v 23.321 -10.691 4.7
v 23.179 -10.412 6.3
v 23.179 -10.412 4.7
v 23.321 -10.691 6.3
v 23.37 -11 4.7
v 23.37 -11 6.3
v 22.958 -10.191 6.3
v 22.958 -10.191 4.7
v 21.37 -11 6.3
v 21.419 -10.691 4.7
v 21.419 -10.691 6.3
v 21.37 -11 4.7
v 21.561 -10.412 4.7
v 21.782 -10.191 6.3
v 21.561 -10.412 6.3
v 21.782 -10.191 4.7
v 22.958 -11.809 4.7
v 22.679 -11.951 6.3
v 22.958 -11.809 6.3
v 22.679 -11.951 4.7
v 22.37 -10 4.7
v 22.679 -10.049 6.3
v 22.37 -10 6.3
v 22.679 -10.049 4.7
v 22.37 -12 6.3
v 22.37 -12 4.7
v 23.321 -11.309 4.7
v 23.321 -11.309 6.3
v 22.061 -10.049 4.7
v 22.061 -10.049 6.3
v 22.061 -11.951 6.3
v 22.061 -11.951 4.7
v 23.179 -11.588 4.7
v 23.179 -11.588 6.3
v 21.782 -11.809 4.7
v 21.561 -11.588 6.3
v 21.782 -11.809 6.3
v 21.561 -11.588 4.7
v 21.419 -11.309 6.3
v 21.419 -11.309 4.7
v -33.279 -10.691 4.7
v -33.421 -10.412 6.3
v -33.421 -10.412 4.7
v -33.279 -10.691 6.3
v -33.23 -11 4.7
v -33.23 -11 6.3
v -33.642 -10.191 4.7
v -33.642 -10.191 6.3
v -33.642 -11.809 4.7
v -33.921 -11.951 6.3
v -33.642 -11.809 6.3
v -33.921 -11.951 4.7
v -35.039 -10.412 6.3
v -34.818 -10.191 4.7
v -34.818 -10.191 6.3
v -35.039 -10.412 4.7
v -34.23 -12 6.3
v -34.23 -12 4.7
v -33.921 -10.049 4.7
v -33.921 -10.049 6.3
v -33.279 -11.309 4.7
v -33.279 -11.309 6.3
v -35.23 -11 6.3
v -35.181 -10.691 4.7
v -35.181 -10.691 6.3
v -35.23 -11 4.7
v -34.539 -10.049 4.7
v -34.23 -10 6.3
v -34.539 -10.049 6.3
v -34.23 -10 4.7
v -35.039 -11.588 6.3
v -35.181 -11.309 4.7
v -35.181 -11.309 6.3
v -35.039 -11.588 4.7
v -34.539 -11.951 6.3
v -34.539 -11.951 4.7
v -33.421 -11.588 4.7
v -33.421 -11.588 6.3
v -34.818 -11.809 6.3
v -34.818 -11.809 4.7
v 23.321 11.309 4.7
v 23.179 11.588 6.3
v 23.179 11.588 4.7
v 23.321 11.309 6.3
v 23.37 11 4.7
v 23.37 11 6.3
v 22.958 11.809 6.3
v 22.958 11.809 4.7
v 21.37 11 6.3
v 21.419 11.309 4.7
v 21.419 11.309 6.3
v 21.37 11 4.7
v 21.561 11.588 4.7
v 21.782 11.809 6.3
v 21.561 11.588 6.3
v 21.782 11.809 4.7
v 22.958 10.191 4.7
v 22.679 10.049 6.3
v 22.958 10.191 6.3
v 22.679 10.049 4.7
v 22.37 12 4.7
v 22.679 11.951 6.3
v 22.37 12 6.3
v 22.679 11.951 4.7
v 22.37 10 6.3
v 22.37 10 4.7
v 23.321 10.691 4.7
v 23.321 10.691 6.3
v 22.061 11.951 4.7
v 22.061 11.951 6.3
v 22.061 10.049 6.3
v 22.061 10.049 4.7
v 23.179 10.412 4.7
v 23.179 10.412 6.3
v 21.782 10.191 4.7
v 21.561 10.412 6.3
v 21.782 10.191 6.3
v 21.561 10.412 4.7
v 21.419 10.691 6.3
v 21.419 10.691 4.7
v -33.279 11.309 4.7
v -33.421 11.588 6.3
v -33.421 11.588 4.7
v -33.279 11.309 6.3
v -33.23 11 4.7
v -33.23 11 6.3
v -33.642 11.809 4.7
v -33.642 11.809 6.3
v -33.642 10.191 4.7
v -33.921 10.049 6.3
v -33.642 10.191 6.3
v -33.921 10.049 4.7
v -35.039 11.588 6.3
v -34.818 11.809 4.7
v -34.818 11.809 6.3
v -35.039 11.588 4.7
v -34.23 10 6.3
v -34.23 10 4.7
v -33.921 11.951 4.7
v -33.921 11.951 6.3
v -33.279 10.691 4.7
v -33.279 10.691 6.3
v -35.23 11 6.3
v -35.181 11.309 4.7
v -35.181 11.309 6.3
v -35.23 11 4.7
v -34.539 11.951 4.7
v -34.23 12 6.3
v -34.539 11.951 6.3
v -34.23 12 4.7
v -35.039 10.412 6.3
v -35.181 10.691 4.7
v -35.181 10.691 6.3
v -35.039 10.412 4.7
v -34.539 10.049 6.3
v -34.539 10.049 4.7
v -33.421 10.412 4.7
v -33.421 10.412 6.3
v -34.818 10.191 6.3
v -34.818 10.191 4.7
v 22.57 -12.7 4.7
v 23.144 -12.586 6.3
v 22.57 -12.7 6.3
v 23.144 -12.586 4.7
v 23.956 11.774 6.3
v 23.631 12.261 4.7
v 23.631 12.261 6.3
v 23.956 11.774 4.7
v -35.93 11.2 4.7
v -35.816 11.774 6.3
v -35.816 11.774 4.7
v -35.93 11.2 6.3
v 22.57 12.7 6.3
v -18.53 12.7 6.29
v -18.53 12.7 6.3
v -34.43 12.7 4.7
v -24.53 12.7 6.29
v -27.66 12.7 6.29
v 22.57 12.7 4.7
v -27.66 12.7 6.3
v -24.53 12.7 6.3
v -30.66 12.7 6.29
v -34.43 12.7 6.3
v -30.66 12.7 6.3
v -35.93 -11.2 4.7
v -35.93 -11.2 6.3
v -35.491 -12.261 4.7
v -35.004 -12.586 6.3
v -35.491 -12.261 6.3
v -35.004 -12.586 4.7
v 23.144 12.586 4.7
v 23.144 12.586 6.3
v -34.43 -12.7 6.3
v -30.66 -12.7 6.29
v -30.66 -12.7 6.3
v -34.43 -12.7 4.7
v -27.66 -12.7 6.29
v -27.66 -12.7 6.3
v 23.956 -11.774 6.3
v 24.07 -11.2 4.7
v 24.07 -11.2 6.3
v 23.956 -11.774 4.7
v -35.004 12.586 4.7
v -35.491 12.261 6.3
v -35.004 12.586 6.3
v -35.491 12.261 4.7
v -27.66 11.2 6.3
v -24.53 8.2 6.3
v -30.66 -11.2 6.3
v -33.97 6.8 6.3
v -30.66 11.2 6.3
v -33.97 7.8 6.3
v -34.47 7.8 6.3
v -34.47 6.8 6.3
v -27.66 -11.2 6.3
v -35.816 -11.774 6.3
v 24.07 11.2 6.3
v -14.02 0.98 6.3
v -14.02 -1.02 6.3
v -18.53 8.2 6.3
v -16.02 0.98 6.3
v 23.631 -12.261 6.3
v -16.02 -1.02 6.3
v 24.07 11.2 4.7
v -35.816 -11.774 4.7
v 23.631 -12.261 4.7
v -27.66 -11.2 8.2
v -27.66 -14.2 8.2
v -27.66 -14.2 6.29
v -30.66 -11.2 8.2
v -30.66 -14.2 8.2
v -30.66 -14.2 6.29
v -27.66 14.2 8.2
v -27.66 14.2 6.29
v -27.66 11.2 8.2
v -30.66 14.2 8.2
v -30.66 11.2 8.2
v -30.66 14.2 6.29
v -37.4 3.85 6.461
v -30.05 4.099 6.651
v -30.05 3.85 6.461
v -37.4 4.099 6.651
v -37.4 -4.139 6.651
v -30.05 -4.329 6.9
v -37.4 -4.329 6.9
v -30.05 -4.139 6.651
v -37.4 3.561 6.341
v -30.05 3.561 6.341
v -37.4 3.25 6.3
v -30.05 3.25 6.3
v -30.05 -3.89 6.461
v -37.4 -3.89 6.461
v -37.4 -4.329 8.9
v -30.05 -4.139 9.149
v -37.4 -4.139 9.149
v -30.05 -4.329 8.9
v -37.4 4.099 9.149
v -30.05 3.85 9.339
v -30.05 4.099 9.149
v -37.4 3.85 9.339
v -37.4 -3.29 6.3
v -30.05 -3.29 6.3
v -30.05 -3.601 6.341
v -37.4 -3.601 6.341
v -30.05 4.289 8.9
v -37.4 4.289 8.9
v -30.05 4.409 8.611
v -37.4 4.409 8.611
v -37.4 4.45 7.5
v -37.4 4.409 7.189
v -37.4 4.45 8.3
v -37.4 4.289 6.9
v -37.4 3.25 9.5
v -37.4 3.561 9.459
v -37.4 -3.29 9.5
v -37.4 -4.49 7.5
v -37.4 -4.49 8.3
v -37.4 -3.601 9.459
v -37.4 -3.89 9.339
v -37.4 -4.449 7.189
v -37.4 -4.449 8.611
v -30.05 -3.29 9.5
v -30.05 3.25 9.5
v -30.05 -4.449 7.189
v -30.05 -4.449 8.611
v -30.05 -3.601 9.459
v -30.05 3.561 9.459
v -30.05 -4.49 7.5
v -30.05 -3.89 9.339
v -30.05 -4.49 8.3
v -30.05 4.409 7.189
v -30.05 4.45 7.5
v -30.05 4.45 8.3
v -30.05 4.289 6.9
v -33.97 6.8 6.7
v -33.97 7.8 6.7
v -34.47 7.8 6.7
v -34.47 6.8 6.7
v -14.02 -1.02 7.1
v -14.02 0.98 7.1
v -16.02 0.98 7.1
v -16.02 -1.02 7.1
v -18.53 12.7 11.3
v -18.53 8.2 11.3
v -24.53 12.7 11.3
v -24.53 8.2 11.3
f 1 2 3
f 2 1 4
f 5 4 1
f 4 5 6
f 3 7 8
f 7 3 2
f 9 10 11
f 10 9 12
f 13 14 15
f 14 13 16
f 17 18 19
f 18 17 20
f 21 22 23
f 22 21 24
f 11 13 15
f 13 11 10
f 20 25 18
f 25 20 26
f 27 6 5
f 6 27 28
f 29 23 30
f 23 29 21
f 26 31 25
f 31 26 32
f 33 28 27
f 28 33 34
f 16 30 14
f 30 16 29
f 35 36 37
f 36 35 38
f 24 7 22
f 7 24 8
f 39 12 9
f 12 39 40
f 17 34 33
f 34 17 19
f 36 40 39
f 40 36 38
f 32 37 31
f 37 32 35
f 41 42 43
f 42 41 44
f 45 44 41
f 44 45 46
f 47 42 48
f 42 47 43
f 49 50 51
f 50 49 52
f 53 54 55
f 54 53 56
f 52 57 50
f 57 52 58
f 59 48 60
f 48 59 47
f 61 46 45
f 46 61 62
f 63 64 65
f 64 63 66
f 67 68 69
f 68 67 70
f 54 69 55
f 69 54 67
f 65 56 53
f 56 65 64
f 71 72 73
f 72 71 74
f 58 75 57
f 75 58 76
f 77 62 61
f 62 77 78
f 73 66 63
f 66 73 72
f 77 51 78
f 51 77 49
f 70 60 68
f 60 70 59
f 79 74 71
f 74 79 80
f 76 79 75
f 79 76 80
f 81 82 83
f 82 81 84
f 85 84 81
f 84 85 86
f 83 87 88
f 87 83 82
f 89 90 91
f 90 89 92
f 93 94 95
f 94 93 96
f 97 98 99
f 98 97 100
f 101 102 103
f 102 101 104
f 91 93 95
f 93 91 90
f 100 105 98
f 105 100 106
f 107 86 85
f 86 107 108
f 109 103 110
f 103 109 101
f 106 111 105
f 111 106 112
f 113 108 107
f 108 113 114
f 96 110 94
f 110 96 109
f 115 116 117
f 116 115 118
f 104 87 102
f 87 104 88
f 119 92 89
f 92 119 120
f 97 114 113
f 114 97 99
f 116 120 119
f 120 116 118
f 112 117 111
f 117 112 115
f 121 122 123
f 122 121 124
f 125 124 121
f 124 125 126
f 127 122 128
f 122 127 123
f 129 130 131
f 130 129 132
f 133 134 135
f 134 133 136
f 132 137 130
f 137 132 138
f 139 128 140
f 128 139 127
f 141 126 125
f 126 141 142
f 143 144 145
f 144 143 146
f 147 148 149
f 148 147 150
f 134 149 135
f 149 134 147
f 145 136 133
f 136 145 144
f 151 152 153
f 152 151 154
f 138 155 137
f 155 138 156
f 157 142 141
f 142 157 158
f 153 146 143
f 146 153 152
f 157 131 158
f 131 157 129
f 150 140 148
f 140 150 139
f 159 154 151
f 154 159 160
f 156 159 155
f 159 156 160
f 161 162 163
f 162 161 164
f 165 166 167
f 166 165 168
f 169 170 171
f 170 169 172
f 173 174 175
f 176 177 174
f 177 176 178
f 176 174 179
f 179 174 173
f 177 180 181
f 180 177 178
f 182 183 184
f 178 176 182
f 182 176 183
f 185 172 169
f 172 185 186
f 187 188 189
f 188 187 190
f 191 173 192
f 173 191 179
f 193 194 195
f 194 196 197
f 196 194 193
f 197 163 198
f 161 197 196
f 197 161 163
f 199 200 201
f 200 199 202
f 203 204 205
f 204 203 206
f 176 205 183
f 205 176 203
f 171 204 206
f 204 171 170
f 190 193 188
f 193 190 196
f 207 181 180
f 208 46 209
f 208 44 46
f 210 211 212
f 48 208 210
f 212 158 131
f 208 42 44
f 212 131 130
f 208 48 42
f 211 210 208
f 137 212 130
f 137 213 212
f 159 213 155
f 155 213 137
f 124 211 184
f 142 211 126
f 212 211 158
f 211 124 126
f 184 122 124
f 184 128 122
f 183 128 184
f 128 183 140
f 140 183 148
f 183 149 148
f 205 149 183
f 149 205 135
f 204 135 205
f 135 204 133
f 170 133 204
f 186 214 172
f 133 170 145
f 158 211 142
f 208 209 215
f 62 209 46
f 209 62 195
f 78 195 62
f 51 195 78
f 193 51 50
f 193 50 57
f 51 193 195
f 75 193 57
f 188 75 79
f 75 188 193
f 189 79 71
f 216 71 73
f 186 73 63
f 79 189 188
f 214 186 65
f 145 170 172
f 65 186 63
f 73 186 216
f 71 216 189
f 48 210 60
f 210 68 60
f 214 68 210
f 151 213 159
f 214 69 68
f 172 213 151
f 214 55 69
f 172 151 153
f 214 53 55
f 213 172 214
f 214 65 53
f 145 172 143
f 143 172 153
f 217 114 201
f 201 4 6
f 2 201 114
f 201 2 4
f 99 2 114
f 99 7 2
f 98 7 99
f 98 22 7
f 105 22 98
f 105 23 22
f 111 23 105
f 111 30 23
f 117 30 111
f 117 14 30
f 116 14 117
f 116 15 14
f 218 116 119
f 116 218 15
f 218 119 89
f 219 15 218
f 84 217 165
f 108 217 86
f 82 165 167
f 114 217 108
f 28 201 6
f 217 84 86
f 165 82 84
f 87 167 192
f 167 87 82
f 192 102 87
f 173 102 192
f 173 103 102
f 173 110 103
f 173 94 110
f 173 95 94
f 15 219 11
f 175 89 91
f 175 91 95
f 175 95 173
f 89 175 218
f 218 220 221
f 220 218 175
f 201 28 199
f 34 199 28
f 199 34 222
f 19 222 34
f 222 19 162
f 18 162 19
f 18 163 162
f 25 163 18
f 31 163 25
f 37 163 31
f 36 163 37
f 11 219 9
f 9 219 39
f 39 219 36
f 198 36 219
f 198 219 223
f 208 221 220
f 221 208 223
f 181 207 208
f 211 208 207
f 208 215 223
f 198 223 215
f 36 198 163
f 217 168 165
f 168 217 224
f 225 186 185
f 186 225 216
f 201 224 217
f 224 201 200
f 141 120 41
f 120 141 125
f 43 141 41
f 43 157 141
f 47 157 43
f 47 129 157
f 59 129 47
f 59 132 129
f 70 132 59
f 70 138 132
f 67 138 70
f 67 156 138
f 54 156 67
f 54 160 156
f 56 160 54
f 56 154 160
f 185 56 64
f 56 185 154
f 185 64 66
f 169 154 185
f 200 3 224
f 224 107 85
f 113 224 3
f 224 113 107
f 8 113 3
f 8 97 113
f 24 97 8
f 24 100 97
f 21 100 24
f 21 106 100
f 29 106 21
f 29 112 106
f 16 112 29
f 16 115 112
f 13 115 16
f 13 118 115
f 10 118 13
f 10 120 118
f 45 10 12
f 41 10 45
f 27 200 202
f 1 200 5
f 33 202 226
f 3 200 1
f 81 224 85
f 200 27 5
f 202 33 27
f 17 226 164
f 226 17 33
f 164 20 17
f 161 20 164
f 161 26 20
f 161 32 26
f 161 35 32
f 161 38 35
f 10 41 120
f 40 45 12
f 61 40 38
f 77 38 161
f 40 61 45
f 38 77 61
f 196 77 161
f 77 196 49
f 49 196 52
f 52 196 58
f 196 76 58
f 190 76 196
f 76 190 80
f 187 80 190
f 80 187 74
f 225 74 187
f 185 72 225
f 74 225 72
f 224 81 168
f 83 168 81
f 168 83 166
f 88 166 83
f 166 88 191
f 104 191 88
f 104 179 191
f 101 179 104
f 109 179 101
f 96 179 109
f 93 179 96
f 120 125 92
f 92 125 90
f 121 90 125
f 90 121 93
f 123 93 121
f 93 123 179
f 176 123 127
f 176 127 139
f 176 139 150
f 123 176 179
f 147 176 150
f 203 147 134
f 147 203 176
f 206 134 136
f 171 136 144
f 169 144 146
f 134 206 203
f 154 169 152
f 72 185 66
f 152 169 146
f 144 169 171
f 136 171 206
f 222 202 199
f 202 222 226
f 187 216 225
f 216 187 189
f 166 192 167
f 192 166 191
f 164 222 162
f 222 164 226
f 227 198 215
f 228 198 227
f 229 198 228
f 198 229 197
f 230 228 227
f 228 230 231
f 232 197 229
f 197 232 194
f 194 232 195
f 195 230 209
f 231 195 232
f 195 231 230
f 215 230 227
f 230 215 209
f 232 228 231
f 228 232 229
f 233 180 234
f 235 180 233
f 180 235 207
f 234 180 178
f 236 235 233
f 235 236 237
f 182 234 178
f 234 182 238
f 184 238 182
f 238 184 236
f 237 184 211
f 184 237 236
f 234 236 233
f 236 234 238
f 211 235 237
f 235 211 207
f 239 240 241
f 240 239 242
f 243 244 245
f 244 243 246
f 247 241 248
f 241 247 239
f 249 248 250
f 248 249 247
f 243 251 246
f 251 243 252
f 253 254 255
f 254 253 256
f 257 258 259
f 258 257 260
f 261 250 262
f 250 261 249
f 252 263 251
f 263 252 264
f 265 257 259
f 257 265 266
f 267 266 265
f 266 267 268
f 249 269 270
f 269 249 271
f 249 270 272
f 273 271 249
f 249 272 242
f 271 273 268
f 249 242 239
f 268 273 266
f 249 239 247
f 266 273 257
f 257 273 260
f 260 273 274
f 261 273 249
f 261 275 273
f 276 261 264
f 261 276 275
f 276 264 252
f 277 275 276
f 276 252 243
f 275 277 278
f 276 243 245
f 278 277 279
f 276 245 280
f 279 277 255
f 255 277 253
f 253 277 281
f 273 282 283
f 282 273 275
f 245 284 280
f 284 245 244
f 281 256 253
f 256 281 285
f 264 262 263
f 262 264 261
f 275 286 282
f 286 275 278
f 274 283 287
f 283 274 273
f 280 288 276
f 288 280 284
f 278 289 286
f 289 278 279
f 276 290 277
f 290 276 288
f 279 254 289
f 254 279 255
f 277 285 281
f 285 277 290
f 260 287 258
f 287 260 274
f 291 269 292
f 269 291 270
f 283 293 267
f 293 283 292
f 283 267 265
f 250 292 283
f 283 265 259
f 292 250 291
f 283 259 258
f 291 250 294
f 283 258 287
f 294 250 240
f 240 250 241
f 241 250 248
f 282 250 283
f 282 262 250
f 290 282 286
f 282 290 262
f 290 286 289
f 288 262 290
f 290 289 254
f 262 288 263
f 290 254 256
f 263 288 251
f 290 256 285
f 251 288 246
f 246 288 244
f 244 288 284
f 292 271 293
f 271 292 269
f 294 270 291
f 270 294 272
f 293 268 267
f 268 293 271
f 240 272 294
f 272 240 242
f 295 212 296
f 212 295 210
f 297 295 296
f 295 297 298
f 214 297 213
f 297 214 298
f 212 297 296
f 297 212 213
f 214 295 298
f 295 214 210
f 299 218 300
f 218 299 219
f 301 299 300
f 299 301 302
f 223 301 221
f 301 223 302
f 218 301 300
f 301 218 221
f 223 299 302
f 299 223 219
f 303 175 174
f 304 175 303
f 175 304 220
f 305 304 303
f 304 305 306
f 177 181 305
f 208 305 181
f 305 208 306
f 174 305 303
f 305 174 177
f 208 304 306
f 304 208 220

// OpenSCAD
// file: ../../screw-post/screw-post.scad
//-----------------------------------------------------------------------
// Screw post: a round post off the floor that a board screws down onto
//
// Two ways to fix:
//   "nut"  clearance hole through the post and floor; the nut sits in a hex
//          trap in the floor's underside, so the screw goes in from the top
//   "tap"  a pilot hole the screw cuts its own thread in (one or two fittings
//          in PLA/PETG); blind, the floor stays whole underneath
// and "head" for a screw up from below (head in a counterbore, nut on top).
//
// Modules, all in the same frame:
//   screwPostGhost()     the screw (and nut), for previews
//   screwPost()          the post: add to the floor
//   screwPostFloorCut()  subtract from the floor: nut trap / counterbore and hole
//
// Frame: origin on the floor top, on the post's axis. Z up; the floor is
// Z = -floorThick .. 0. Units: mm.
//
// Sizes: "M2", "M2.5", "M3". screwPostScrew(size, ...) says which screw length
// reaches, so a project can assert it has that screw in the kit.
//-----------------------------------------------------------------------

//-- [name, screw Ø, nut across flats, nut thick, head Ø, head height, tap hole, post Ø]
//-- Nuts ISO 4032; heads ISO 7380 button. Tap holes: the usual ~0.8 x Ø for plastic
screwSizes = [
  ["M2",   2.0, 4.0, 1.6, 3.5, 1.1, 1.6, 5.0],
  ["M2.5", 2.5, 5.0, 2.0, 4.4, 1.4, 2.1, 6.0],    // head 4.4: measured on the kit's M2.5 (controller base)
  ["M3",   3.0, 5.5, 2.4, 5.7, 1.65, 2.5, 7.0],
];

screwHoleClear = 0.4;     // added to the screw Ø for a clearance hole
screwNutClear  = 0.3;     // CAL: across flats, nut trap over the nut. Set by the fit piece
screwTapClear  = 0.0;     // CAL: added to the tap hole. Set by the fit piece
screwHeadClear = 0.6;     // counterbore over the head Ø

function screwSize(size) = let (i = search([size], screwSizes)[0])
  assert(i != [] && i != undef, str("unknown screw size ", size)) screwSizes[i];
function screwDia(size)    = screwSize(size)[1];
function screwNutAF(size)  = screwSize(size)[2];
function screwNutH(size)   = screwSize(size)[3];
function screwHeadDia(size)= screwSize(size)[4];
function screwHeadH(size)  = screwSize(size)[5];
function screwPostDia(size)= screwSize(size)[7];

//-- Shortest screw that fills the nut, from the top of the clamped part (h + clamp
//-- above the floor) down to the nut trap's underside. Round up to a length you have.
function screwPostScrew(size, h, floorThick, clamp = 1.6) = h + clamp + floorThick;

module screwPostGhost(size, h, floorThick, clamp = 1.6, length, how = "nut")
{
  d = screwDia(size);
  L = is_undef(length) ? screwPostScrew(size, h, floorThick, clamp) : length;
  top = h + clamp;
  if (how == "head")
  {
    %color("Silver") translate([0, 0, -floorThick]) cylinder(d = screwHeadDia(size), h = screwHeadH(size), $fn = 24);
    %color("Silver") translate([0, 0, -floorThick + screwHeadH(size)]) cylinder(d = d, h = L, $fn = 16);
  }
  else
  {
    %color("Silver") translate([0, 0, top]) cylinder(d = screwHeadDia(size), h = screwHeadH(size), $fn = 24);
    %color("Silver") translate([0, 0, top - L]) cylinder(d = d, h = L, $fn = 16);
    if (how == "nut")
      %color("DimGray") translate([0, 0, -floorThick]) rotate([0, 0, 30]) cylinder(d = screwNutAF(size)/cos(30), h = screwNutH(size), $fn = 6);
  }
}

//-- how: "nut" | "head" (through hole) or "tap" (blind pilot hole). postDia defaults by size
module screwPost(size, h, how = "nut", postDia, tapClear = screwTapClear)
{
  pd = is_undef(postDia) ? screwPostDia(size) : postDia;
  hole = how == "tap" ? screwSize(size)[6] + tapClear : screwDia(size) + screwHoleClear;
  difference()
  {
    translate([0, 0, -0.01]) cylinder(d = pd, h = h + 0.01, $fn = 40);
    translate([0, 0, how == "tap" ? 0.6 : -1]) cylinder(d = hole, h = h + 2, $fn = 24);
    //-- lead-in so the screw starts square
    translate([0, 0, h - 0.4]) cylinder(d1 = hole, d2 = hole + 0.8, h = 0.41, $fn = 24);
  }
}

//-- "nut": hex trap from the underside, opening a little over the nut so it sits flush.
//-- "head": counterbore for the head. "tap": nothing.
module screwPostFloorCut(size, floorThick, how = "nut", nutClear = screwNutClear)
{
  d = screwDia(size) + screwHoleClear;
  if (how == "nut")
  {
    af = screwNutAF(size) + nutClear;
    translate([0, 0, -floorThick - 1]) rotate([0, 0, 30]) cylinder(d = af/cos(30), h = screwNutH(size) + 0.1 + 1, $fn = 6);
    translate([0, 0, -floorThick - 1]) cylinder(d = d + 0.4, h = floorThick + 2, $fn = 24);
  }
  if (how == "head")
  {
    translate([0, 0, -floorThick - 1]) cylinder(d = screwHeadDia(size) + screwHeadClear, h = screwHeadH(size) + 0.2 + 1, $fn = 32);
    translate([0, 0, -floorThick - 1]) cylinder(d = d + 0.4, h = floorThick + 2, $fn = 24);
  }
  assert(how == "tap" || floorThick >= (how == "nut" ? screwNutH(size) : screwHeadH(size)) + 0.1 + 0.3,
         str("floor too thin for the ", size, " ", how));
}
// file: ../../usb-c-port/usb-c-port.scad
//-----------------------------------------------------------------------
// USB-C port through a wall, flush: the socket's metal shell sits in a
// close-fitting pocket in the wall, walled in on all four sides, its face
// level with the outside. The cable seats the way it does on a laptop.
//
// A board's socket only overhangs the board edge by a mm or so, less than
// the wall. So the board's end tucks into a shallow relief in the wall's
// inner face, the width of the board, leaving the wall round the socket
// thin enough for the face to reach the outside. When that would leave less
// than usbcMinWall (a socket that barely overhangs), the face sits back from
// the outside instead: usbcRecess() says how far.
//
// Modules, all in the same frame:
//   usbcGhost()     the socket and the board's end, for previews
//   usbcWallCut()   subtract from the wall: socket pocket and board relief
//
// Frame: origin on the floor top at the wall's inner face, under the socket's
// axis. +X into the box, Z up. The wall is X = -wall .. 0. The board is
// component side up, socket on top (top-mount, as on the FireBeetle, C3 Super
// Mini and S3 DevKitC). Units: mm.
//
// usbcBoardEdgeX() gives where the board's edge lands (negative: inside the
// wall), so a holder can put its posts or pocket to match.
//-----------------------------------------------------------------------

//-- The socket: USB-C receptacle shell (USB-IF 8.34 x 2.56 plug, receptacle shell ~8.94 x 3.26)
usbcShellW     = 8.94;
usbcShellH     = 3.26;    // CAL per board: measured 3.2 on the FireBeetle
usbcShellR     = 1.2;     // CAL: end radius. Full round would be 1.63; most shells are squarer
usbcShellDepth = 7.35;    // face to back

//-- The pocket
usbcClearance  = 0.15;    // CAL: per side, shell to pocket. Set by the fit piece
usbcMinWall    = 1.0;     // thinnest wall left round the socket
usbcReliefGap  = 0.3;     // board relief over the board, each side and above/below
usbcChamfer    = 0.3;     // lead-in on the outside edge

//-- How far the socket face sits back from the outside: 0 (flush) unless the socket
//-- overhangs the board edge by less than usbcMinWall
function usbcRecess(overhang, minWall = usbcMinWall) = max(0, minWall - overhang);
//-- X of the board's socket edge in this frame
function usbcBoardEdgeX(wall, overhang, recess) =
  -wall + (is_undef(recess) ? usbcRecess(overhang) : recess) + overhang;
//-- Z of the board's underside above the floor top
function usbcBoardZ(axisZ, pcb, shellH = usbcShellH) = axisZ - shellH/2 - pcb;

module usbcShell2D(grow = 0, w = usbcShellW, h = usbcShellH, r = usbcShellR)
{
  offset(r = r + grow, $fn = 24) square([w - 2*r, h - 2*r], center = true);
}

//-- axisZ: socket axis above the floor. boardW/pcb: the board, for the ghost and relief.
//-- shift: socket centre across the board's width from the board's centre line (+Y)
module usbcGhost(axisZ, wall, overhang, boardW, pcb = 1.6, recess, shift = 0, shellH = usbcShellH, shellW = usbcShellW)
{
  ex = usbcBoardEdgeX(wall, overhang, recess);
  %color("Silver") translate([ex - overhang, 0, axisZ]) rotate([0, 90, 0]) rotate([0, 0, 90])
    linear_extrude(usbcShellDepth) usbcShell2D(w = shellW, h = shellH);
  %color("DarkSlateGray") translate([ex, -boardW/2 - shift, usbcBoardZ(axisZ, pcb, shellH)]) cube([12, boardW, pcb]);
}

module usbcWallCut(axisZ, wall, overhang, boardW, pcb = 1.6, recess, shift = 0,
                   clearance = usbcClearance, shellH = usbcShellH, shellW = usbcShellW, aboveBoard)
{
  rc = is_undef(recess) ? usbcRecess(overhang) : recess;
  ex = usbcBoardEdgeX(wall, overhang, rc);
  bz = usbcBoardZ(axisZ, pcb, shellH);
  //-- what stands on the board near its edge: the socket, unless told taller
  up = is_undef(aboveBoard) ? shellH : aboveBoard;
  assert(ex - overhang + wall >= -0.01, "socket face would stand proud of the wall");
  assert(rc > 0 || overhang >= usbcMinWall - 0.01, "wall round the socket under usbcMinWall");
  //-- socket pocket, through the wall
  translate([-wall - 1, 0, axisZ]) rotate([0, 90, 0]) rotate([0, 0, 90])
    linear_extrude(wall + 2) usbcShell2D(clearance, w = shellW, h = shellH);
  //-- lead-in chamfer on the outside
  translate([-wall, 0, axisZ]) rotate([0, 90, 0]) rotate([0, 0, 90])
    hull()
    {
      translate([0, 0, -0.01]) linear_extrude(0.01) usbcShell2D(clearance + usbcChamfer, w = shellW, h = shellH);
      translate([0, 0, usbcChamfer]) linear_extrude(0.01) usbcShell2D(clearance, w = shellW, h = shellH);
    }
  //-- board relief in the inner face, when the board's edge lands inside the wall
  if (ex < 0)
    translate([ex - usbcReliefGap, -boardW/2 - shift - usbcReliefGap, bz - usbcReliefGap])
      cube([-ex + usbcReliefGap + 1, boardW + 2*usbcReliefGap, pcb + up + 2*usbcReliefGap]);
}
// file: board.scad
// The board as a solid, for the catalogue (the Ghost is % so it never renders):
// PCB, USB-C socket, charge LED, RGB LED, side buttons, battery socket.
// One board per entry in shifts, at the fit piece's pitch.
include <../firebeetle-esp32e.scad>

variant = "ESP32-E";
wall    = 2.4;
postH   = 4.7;
shifts  = [0];      // postShift per board
pitch   = 32;

module fbSolid(v, wall, postH, postShift)
{
  f = fbVariant(v);
  L = fbLength(v); W = fbWidth(v); pcb = fbPcb(v);
  ex = fbEdgeX(v, wall, postShift);
  top = postH + pcb;
  difference()
  {
    translate([ex, -f[9], postH]) linear_extrude(pcb)
      offset(r = fbCornerR, $fn = 16) offset(delta = -fbCornerR) square([L, W]);
    for (h = fbHoles(v, wall, postShift))
      translate([h[0], h[1], postH - 1]) cylinder(d = 2.0, h = pcb + 2, $fn = 20);
  }
  translate([ex - fbOverhang(v), 0, fbAxisZ(v, postH)]) rotate([0, 90, 0]) rotate([0, 0, 90])
    linear_extrude(fbUsbDepth) usbcShell2D(h = fbShellH(v));
  led = fbToFrame(v, wall, f[12][0], f[12][1], postShift);
  translate([led[0] - 0.25, led[1] - 0.5, top - 0.01]) cube([0.5, 1.0, 0.41]);
  if (len(f[13]) == 2)
  {
    rgb = fbToFrame(v, wall, f[13][0], f[13][1], postShift);
    translate([rgb[0] - 1, rgb[1] - 1, top - 0.01]) cube([2, 2, 0.81]);
  }
  if (f[14] > 0)
    for (bx = [0, W])
    {
      b = fbToFrame(v, wall, bx, f[14], postShift);
      translate([b[0] - 1.5, b[1] - 1.5, top - 0.01]) cube([3, 3, 1.91]);
    }
  if (f[15] > 0)
  {
    b = fbToFrame(v, wall, W, f[15], postShift);
    translate([b[0] - 3, b[1] - 4.5, top - 0.01]) cube([6, 4.5, 5.01]);
  }
}

for (i = [0 : len(shifts) - 1]) translate([0, i*pitch, 0]) fbSolid(variant, wall, postH, shifts[i]);
// main file
// The board as a solid, seated on its carrier, for the catalogue (board.scad's solid moved
// into the carrier frame). The moving part of the "On a carrier" view, and the body for the
// collision check against carrier.scad.
use <../firebeetle-esp32e.scad>
use <board.scad>

variant = "ESP32-E";
wall    = 2.4;
postH   = 4.7;

translate(fbCarrierAt(variant, wall)) fbSolid(variant, wall, postH, 0);
